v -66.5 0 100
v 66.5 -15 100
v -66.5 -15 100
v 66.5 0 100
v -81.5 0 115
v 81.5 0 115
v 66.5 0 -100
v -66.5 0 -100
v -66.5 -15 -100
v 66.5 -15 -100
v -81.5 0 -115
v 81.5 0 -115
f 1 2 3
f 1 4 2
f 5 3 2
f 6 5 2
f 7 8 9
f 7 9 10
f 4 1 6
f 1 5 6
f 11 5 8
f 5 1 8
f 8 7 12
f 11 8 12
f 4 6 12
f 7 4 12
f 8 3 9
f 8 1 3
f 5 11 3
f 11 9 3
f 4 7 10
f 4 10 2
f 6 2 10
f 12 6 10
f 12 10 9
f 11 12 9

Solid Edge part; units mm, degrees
sketch "Sketch1" plane through (0, 0, 0) normal (0, -1, 0) x (1, 0, 0)
  line L0 (66.5, 100) -> (-66.5, 100)
  line L1 (-66.5, 100) -> (-66.5, -100)
  line L2 (-66.5, -100) -> (66.5, -100)
  line L3 (66.5, -100) -> (66.5, 100)
  line L4 (81.5, 115) -> (-81.5, 115)
  line L5 (-81.5, 115) -> (-81.5, -115)
  line L6 (-81.5, -115) -> (81.5, -115)
  line L7 (81.5, -115) -> (81.5, 115)
  dimension "D1" = 133
  dimension "D2" = 200
  dimension "D3" = 15
extrude "Protrusion1" add sketch "Sketch1" along normal blind 15
chamfer "Fase_1" distance 15 angle 45 4 edges at (-81.5, -15, 0) (0, -15, 115) (81.5, -15, 0) (0, -15, -115)
